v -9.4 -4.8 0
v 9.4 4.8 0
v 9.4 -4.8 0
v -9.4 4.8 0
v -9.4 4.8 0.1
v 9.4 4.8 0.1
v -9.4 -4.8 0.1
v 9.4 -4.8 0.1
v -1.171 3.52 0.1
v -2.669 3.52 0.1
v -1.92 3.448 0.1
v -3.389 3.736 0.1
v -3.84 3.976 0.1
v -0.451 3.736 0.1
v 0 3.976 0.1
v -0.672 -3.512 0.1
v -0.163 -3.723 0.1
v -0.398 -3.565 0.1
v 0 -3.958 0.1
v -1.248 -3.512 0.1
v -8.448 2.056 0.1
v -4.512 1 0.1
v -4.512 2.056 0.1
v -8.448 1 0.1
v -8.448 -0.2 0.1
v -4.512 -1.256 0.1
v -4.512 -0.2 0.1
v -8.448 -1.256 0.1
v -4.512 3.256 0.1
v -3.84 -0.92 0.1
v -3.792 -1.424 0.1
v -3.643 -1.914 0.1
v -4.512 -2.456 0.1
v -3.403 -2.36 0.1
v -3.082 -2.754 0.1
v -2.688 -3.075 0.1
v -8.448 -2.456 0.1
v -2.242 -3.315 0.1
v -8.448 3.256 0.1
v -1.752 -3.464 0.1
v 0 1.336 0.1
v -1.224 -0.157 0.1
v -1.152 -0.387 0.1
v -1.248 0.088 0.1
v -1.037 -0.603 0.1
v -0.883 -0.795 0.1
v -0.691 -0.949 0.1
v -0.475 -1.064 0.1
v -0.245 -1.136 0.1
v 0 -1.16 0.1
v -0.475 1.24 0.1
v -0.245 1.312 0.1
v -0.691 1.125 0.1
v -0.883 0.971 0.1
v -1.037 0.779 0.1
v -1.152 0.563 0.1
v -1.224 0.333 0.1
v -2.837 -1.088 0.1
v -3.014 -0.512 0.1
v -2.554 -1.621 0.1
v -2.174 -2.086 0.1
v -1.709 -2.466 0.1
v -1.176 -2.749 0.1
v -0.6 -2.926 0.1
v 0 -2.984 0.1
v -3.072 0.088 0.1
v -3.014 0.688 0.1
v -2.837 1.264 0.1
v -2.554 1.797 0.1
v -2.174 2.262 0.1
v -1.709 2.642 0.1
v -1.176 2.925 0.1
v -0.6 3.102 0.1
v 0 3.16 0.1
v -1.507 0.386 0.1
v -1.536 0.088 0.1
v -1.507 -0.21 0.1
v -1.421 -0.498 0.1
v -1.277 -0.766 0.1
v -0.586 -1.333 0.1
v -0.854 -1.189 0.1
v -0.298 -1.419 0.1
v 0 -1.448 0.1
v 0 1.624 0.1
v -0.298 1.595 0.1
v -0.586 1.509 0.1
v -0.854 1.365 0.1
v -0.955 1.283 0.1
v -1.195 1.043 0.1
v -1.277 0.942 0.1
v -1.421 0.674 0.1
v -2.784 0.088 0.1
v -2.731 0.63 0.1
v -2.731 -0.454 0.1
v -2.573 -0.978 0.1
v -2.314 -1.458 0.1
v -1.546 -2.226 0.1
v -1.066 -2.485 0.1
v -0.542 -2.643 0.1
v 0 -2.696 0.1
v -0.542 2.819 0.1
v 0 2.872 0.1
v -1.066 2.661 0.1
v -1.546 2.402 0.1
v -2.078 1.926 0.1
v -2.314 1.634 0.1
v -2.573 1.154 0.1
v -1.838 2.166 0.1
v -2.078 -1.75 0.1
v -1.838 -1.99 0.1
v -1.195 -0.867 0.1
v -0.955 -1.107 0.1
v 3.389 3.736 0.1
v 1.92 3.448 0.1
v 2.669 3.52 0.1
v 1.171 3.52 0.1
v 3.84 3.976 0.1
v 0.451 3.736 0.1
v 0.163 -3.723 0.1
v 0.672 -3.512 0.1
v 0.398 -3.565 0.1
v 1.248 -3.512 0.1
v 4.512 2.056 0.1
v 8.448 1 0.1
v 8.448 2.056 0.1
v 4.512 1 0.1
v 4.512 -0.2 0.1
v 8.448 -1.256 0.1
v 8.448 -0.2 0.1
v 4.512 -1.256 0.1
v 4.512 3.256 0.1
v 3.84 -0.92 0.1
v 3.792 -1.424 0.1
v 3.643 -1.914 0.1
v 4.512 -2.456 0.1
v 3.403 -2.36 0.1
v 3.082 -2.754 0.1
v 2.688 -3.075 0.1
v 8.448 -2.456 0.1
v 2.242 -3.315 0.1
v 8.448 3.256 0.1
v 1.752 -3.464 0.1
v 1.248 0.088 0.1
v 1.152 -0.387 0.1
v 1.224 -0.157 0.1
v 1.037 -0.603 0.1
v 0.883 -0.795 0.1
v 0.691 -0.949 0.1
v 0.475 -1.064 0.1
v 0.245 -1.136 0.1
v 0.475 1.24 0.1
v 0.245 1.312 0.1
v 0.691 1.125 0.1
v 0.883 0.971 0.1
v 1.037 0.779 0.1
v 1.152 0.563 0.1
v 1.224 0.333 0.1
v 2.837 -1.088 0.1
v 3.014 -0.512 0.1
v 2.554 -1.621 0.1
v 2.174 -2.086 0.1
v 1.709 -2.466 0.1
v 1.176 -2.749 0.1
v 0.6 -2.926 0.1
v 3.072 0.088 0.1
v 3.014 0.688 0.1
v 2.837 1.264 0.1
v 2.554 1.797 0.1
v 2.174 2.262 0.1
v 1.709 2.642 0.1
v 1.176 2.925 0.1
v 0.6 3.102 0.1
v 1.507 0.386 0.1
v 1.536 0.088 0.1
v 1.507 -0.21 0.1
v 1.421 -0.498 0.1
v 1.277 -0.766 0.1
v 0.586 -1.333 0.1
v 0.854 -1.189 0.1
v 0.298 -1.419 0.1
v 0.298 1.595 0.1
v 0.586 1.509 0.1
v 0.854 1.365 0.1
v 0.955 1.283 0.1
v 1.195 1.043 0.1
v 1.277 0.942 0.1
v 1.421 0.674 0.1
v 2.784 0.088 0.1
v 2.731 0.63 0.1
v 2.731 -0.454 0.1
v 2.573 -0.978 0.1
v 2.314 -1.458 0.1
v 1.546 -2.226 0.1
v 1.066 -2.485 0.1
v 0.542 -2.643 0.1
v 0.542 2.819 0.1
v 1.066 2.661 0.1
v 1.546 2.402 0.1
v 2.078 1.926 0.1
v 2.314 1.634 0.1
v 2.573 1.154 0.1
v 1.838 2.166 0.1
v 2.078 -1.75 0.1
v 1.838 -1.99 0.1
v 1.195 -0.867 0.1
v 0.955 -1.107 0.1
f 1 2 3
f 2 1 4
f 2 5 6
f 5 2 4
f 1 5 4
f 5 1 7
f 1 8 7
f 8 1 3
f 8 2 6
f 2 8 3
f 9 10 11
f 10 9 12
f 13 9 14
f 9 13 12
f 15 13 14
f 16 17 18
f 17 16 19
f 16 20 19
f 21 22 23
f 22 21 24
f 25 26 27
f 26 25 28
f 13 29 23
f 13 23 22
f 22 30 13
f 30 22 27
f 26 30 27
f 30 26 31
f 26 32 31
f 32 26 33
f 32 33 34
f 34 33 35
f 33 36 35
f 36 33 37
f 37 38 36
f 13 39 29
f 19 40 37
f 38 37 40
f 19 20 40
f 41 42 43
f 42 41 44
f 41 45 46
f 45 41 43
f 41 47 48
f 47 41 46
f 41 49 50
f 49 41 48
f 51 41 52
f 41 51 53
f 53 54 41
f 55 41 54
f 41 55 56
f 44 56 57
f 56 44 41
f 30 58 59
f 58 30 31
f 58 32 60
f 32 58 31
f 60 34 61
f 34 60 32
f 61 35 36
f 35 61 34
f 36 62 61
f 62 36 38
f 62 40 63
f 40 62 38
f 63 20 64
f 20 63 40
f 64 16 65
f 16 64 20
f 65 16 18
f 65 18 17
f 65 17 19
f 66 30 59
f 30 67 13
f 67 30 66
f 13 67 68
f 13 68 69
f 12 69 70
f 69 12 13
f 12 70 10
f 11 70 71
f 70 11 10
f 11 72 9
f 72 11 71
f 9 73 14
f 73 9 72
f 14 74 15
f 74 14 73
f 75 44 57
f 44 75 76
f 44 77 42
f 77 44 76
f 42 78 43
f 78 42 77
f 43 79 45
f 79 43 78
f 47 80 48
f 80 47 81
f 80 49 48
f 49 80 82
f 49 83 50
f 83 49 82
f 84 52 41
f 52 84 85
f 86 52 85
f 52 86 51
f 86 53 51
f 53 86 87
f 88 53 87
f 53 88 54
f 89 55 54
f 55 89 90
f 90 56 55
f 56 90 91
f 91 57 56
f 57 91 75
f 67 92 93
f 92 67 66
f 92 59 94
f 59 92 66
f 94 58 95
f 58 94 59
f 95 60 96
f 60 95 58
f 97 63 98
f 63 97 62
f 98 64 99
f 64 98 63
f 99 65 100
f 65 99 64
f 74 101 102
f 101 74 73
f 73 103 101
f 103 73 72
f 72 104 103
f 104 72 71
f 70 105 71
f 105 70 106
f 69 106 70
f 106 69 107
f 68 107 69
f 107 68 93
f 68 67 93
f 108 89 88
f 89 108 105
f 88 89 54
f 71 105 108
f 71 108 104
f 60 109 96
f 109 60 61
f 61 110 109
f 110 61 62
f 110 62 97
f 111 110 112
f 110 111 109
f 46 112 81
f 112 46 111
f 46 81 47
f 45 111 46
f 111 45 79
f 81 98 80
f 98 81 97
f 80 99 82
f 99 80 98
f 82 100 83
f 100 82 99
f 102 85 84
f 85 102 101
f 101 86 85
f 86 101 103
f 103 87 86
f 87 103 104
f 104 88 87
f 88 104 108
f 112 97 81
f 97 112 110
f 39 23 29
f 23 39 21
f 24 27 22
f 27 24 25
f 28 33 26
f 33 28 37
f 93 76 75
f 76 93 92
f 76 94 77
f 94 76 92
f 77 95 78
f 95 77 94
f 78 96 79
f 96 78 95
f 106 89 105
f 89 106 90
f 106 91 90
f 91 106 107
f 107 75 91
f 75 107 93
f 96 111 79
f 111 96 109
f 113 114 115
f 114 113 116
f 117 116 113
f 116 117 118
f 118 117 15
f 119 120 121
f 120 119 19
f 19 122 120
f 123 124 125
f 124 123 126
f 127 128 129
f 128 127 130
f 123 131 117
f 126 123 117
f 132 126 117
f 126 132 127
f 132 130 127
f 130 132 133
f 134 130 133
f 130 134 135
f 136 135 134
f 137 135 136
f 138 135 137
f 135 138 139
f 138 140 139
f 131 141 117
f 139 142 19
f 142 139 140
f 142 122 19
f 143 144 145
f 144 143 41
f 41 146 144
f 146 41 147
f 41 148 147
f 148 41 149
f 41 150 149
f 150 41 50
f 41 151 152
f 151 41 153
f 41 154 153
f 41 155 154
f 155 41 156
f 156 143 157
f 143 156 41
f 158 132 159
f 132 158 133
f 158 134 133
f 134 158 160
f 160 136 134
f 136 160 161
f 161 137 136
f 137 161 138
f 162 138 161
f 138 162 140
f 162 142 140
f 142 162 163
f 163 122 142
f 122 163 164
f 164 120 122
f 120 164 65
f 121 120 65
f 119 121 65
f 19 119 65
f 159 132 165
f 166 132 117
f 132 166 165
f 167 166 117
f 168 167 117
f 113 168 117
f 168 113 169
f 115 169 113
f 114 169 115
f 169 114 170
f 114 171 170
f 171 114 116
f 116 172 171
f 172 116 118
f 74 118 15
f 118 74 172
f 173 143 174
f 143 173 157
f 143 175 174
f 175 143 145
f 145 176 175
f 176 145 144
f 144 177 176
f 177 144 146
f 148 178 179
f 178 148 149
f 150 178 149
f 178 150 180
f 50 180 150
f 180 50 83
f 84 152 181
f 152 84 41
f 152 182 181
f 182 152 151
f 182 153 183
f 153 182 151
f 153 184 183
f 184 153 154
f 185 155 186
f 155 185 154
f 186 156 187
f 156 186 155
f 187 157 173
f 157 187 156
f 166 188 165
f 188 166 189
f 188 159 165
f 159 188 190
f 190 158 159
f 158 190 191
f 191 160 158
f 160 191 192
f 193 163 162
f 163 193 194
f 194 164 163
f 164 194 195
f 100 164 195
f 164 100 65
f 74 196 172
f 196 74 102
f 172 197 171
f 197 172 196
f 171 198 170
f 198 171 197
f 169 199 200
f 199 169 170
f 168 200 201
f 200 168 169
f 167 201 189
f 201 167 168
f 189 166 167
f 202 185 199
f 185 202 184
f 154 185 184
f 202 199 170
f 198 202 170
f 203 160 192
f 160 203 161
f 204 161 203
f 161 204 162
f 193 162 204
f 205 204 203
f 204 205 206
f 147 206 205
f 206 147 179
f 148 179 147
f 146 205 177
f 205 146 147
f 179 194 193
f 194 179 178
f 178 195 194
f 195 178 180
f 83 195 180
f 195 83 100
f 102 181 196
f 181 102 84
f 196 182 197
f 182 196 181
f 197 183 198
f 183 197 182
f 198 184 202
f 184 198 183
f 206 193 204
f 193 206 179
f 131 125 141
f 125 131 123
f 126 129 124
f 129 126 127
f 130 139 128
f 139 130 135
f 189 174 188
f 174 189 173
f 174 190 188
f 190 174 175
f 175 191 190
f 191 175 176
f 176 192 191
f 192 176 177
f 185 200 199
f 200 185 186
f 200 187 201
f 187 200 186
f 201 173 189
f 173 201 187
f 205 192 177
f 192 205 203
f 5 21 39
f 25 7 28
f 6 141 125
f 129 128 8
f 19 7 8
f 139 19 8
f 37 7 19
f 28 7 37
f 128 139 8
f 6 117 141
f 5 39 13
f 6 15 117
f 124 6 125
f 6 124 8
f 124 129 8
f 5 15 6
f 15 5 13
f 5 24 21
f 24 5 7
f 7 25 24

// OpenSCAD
// file: s/169625as02.scad
use <../../lib.scad>
function ldraw_lib__s__169625as02() = [
// 0 ~Coast Guard (1995) Logo with Three Red Horizontal Stripes and Life Saver on Blue Crest - Quarter of Life Saver
// 0 Name: s\169625as02.dat
// 0 Author: Max Martin Richter [MMR1988]
// 0 !LDRAW_ORG Subpart UPDATE 2024-08
// 0 !LICENSE Licensed under CC BY 4.0 : see CAreadme.txt
// 
// 0 BFC CERTIFY CCW
  [0,"BFC","CERTIFY"],
  [0,"BFC","CCW"],
// 
// 0 !HISTORY 2024-09-30 [OrionP] Official Update 2024-08
// 
// 
// 4 16 -3.2 0 .3 -3.14 0 .92 -5.69 0 1.43 -5.8 0 .3
  [4,16,-3.2,0,.3,-3.14,0,.92,-5.69,0,1.43,-5.8,0,.3],
// 4 16 -3.14 0 -.32 -3.2 0 .3 -5.8 0 .3 -5.69 0 -.83
  [4,16,-3.14,0,-.32,-3.2,0,.3,-5.8,0,.3,-5.69,0,-.83],
// 4 16 -2.96 0 -.92 -3.14 0 -.32 -5.69 0 -.83 -5.36 0 -1.92
  [4,16,-2.96,0,-.92,-3.14,0,-.32,-5.69,0,-.83,-5.36,0,-1.92],
// 4 16 -2.66 0 -1.48 -2.96 0 -.92 -5.36 0 -1.92 -4.82 0 -2.92
  [4,16,-2.66,0,-1.48,-2.96,0,-.92,-5.36,0,-1.92,-4.82,0,-2.92],
// 4 16 -2.66 0 2.08 -2.49 0 2.29 -4.33 0 4.13 -4.82 0 3.52
  [4,16,-2.66,0,2.08,-2.49,0,2.29,-4.33,0,4.13,-4.82,0,3.52],
// 4 16 -2.96 0 1.52 -2.66 0 2.08 -4.82 0 3.52 -5.36 0 2.52
  [4,16,-2.96,0,1.52,-2.66,0,2.08,-4.82,0,3.52,-5.36,0,2.52],
// 4 16 -3.14 0 .92 -2.96 0 1.52 -5.36 0 2.52 -5.69 0 1.43
  [4,16,-3.14,0,.92,-2.96,0,1.52,-5.36,0,2.52,-5.69,0,1.43],
// 4 16 -4.33 0 -3.53 -2.49 0 -1.69 -2.66 0 -1.48 -4.82 0 -2.92
  [4,16,-4.33,0,-3.53,-2.49,0,-1.69,-2.66,0,-1.48,-4.82,0,-2.92],
];
module ldraw_lib__s__169625as02(step=0, col=false, unit=2/5, alt=false, line=0.2, solid=!$preview)
    makepoly(ldraw_lib__s__169625as02(), step=step, col=col, unit=unit, alt=alt, line=line, solid=solid);
ldraw_lib__s__169625as02(line=0.2);
// file: ../p/box5-12.scad
use <../lib.scad>
function ldraw_lib__box5_12() = [
// 0 Box with 5 Faces without Any Edges
// 0 Name: box5-12.dat
// 0 Author: Chris Dee [cwdee]
// 0 !LDRAW_ORG Primitive UPDATE 2009-02
// 0 !LICENSE Licensed under CC BY 4.0 : see CAreadme.txt
// 
// 0 BFC CERTIFY CCW
  [0,"BFC","CERTIFY"],
  [0,"BFC","CCW"],
// 
// 0 !HISTORY 2009-09-03 [PTadmin] Official Update 2009-02
// 
// 
// 4 16 1 1 1 1 1 -1 -1 1 -1 -1 1 1
  [4,16,1,1,1,1,1,-1,-1,1,-1,-1,1,1],
// 4 16 -1 0 1 1 0 1 1 1 1 -1 1 1
  [4,16,-1,0,1,1,0,1,1,1,1,-1,1,1],
// 4 16 -1 0 -1 -1 0 1 -1 1 1 -1 1 -1
  [4,16,-1,0,-1,-1,0,1,-1,1,1,-1,1,-1],
// 4 16 1 0 -1 -1 0 -1 -1 1 -1 1 1 -1
  [4,16,1,0,-1,-1,0,-1,-1,1,-1,1,1,-1],
// 4 16 1 0 1 1 0 -1 1 1 -1 1 1 1
  [4,16,1,0,1,1,0,-1,1,1,-1,1,1,1],
// 0
];
module ldraw_lib__box5_12(step=0, col=false, unit=2/5, alt=false, line=0.2, solid=!$preview)
    makepoly(ldraw_lib__box5_12(), step=step, col=col, unit=unit, alt=alt, line=line, solid=solid);
ldraw_lib__box5_12(line=0.2);
// main file
use <../lib.scad>
use <../p/box5-12.scad>
use <s/169625as01.scad>
use <s/169625as02.scad>
function ldraw_lib__170904e() = [
// 0 Sticker  1.2 x  2.4 with Coast Guard (1995) Logo on White
// 0 Name: 170904e.dat
// 0 Author: Chris Böhnke [KnightOfTarenta]
// 0 !LDRAW_ORG Part UPDATE 2025-06
// 0 !LICENSE Licensed under CC BY 4.0 : see CAreadme.txt
// 
// 0 BFC CERTIFY CCW
  [0,"BFC","CERTIFY"],
  [0,"BFC","CCW"],
// 
// 0 !KEYWORDS Boats, Bricklink 4022stk01, C26 Sea Cutter, Rebrickable 170904
// 0 !KEYWORDS Set 4022, Ships
// 
// 0 !HISTORY 2025-06-26 [OrionP] Official Update 2025-06
// 
// 0 // Sticker Base
// 1 16 0 -0.25 0 23.5 0 0 0 0.25 0 0 0 12 box5-12.dat
  [1,16,0,-0.25,0,23.5,0,0,0,0.25,0,0,0,12, ldraw_lib__box5_12()],
// 
// 0 // Coast Guard Logo
// 1 15 0 -.25 -.14 1.2 0 0 0 1 0 0 0 1.2 s\169625as01.dat
  [1,15,0,-.25,-.14,1.2,0,0,0,1,0,0,0,1.2, ldraw_lib__s__169625as01()],
// 1 15 0 -.25 -.14 1.2 0 0 0 1 0 0 0 1.2 s\169625as02.dat
  [1,15,0,-.25,-.14,1.2,0,0,0,1,0,0,0,1.2, ldraw_lib__s__169625as02()],
// 1 15 0 -.25 -.14 -1.2 0 0 0 1 0 0 0 1.2 s\169625as01.dat
  [1,15,0,-.25,-.14,-1.2,0,0,0,1,0,0,0,1.2, ldraw_lib__s__169625as01()],
// 1 15 0 -.25 -.14 -1.2 0 0 0 1 0 0 0 1.2 s\169625as02.dat
  [1,15,0,-.25,-.14,-1.2,0,0,0,1,0,0,0,1.2, ldraw_lib__s__169625as02()],
// 
// 0 // Colour 15 White
// 3 15 -23.5 -.25 12 -21.12 -.25 5.14 -21.12 -.25 8.14
  [3,15,-23.5,-.25,12,-21.12,-.25,5.14,-21.12,-.25,8.14],
// 3 15 -21.12 -.25 -.5 -23.5 -.25 -12 -21.12 -.25 -3.14
  [3,15,-21.12,-.25,-.5,-23.5,-.25,-12,-21.12,-.25,-3.14],
// 3 15 23.5 -.25 12 21.12 -.25 8.14 21.12 -.25 5.14
  [3,15,23.5,-.25,12,21.12,-.25,8.14,21.12,-.25,5.14],
// 3 15 21.12 -.25 -.5 21.12 -.25 -3.14 23.5 -.25 -12
  [3,15,21.12,-.25,-.5,21.12,-.25,-3.14,23.5,-.25,-12],
// 3 15 0 -.25 -9.896 -23.5 -.25 -12 23.5 -.25 -12
  [3,15,0,-.25,-9.896,-23.5,-.25,-12,23.5,-.25,-12],
// 3 15 21.12 -.25 -6.14 0 -.25 -9.896 23.5 -.25 -12
  [3,15,21.12,-.25,-6.14,0,-.25,-9.896,23.5,-.25,-12],
// 3 15 -21.12 -.25 -6.14 -23.5 -.25 -12 0 -.25 -9.896
  [3,15,-21.12,-.25,-6.14,-23.5,-.25,-12,0,-.25,-9.896],
// 3 15 -21.12 -.25 -3.14 -23.5 -.25 -12 -21.12 -.25 -6.14
  [3,15,-21.12,-.25,-3.14,-23.5,-.25,-12,-21.12,-.25,-6.14],
// 3 15 21.12 -.25 -3.14 21.12 -.25 -6.14 23.5 -.25 -12
  [3,15,21.12,-.25,-3.14,21.12,-.25,-6.14,23.5,-.25,-12],
// 3 15 23.5 -.25 12 9.6 -.25 9.94 21.12 -.25 8.14
  [3,15,23.5,-.25,12,9.6,-.25,9.94,21.12,-.25,8.14],
// 3 15 -23.5 -.25 12 -21.12 -.25 8.14 -9.6 -.25 9.94
  [3,15,-23.5,-.25,12,-21.12,-.25,8.14,-9.6,-.25,9.94],
// 3 15 23.5 -.25 12 0 -.25 9.94 9.6 -.25 9.94
  [3,15,23.5,-.25,12,0,-.25,9.94,9.6,-.25,9.94],
// 4 15 21.12 -.25 5.14 21.12 -.25 2.5 23.5 -.25 -12 23.5 -.25 12
  [4,15,21.12,-.25,5.14,21.12,-.25,2.5,23.5,-.25,-12,23.5,-.25,12],
// 3 15 21.12 -.25 2.5 21.12 -.25 -.5 23.5 -.25 -12
  [3,15,21.12,-.25,2.5,21.12,-.25,-.5,23.5,-.25,-12],
// 4 15 -23.5 -.25 12 -9.6 -.25 9.94 0 -.25 9.94 23.5 -.25 12
  [4,15,-23.5,-.25,12,-9.6,-.25,9.94,0,-.25,9.94,23.5,-.25,12],
// 4 15 -21.12 -.25 5.14 -23.5 -.25 12 -23.5 -.25 -12 -21.12 -.25 2.5
  [4,15,-21.12,-.25,5.14,-23.5,-.25,12,-23.5,-.25,-12,-21.12,-.25,2.5],
// 3 15 -23.5 -.25 -12 -21.12 -.25 -.5 -21.12 -.25 2.5
  [3,15,-23.5,-.25,-12,-21.12,-.25,-.5,-21.12,-.25,2.5],
];
module ldraw_lib__170904e(step=0, col=false, unit=2/5, alt=false, line=0.2, solid=!$preview)
    makepoly(ldraw_lib__170904e(), step=step, col=col, unit=unit, alt=alt, line=line, solid=solid);
ldraw_lib__170904e(line=0.2);
